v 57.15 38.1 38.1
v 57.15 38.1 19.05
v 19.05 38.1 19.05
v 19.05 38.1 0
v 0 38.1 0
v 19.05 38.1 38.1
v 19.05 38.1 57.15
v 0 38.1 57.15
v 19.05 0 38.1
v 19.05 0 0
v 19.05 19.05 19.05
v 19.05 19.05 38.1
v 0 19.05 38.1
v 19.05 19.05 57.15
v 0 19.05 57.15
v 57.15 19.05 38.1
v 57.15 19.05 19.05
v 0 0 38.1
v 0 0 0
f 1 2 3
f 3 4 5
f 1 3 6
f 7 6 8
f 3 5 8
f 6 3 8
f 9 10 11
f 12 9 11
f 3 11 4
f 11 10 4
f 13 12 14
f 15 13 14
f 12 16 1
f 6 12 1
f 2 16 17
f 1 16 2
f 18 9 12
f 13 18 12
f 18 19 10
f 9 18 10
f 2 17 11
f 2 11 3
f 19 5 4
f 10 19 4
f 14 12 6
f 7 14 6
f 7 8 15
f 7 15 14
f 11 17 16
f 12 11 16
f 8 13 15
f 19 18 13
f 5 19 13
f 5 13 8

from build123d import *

# Parameters (mm, degrees)
F0_W     = 19.05
F0_H     = 38.1
F1_DEPTH = 57.15
F2_W     = 19.05
F2_H     = 19.05
F3_DEPTH = 19.05
F4_W     = 19.05
F4_H     = 19.05
F5_DEPTH = 38.1


with BuildPart() as f1:
    # F0 (on Top) → F1 (new body)
    with BuildSketch(Plane.XY):
        with Locations((9.525, 19.05)):
            Rectangle(F0_W, F0_H)
    extrude(amount=F1_DEPTH)

    # F2 (on face) → F3 (cut)
    with BuildSketch(Plane.YZ.offset(19.05)):
        with Locations((9.525, 47.625)):
            Rectangle(F2_W, F2_H)
    extrude(amount=-F3_DEPTH, mode=Mode.SUBTRACT)

    # F4 (on face) → F5 (join)
    with BuildSketch(Plane.YZ.offset(19.05)):
        with Locations((28.575, 28.575)):
            Rectangle(F4_W, F4_H)
    extrude(amount=F5_DEPTH)


solid = f1.part
